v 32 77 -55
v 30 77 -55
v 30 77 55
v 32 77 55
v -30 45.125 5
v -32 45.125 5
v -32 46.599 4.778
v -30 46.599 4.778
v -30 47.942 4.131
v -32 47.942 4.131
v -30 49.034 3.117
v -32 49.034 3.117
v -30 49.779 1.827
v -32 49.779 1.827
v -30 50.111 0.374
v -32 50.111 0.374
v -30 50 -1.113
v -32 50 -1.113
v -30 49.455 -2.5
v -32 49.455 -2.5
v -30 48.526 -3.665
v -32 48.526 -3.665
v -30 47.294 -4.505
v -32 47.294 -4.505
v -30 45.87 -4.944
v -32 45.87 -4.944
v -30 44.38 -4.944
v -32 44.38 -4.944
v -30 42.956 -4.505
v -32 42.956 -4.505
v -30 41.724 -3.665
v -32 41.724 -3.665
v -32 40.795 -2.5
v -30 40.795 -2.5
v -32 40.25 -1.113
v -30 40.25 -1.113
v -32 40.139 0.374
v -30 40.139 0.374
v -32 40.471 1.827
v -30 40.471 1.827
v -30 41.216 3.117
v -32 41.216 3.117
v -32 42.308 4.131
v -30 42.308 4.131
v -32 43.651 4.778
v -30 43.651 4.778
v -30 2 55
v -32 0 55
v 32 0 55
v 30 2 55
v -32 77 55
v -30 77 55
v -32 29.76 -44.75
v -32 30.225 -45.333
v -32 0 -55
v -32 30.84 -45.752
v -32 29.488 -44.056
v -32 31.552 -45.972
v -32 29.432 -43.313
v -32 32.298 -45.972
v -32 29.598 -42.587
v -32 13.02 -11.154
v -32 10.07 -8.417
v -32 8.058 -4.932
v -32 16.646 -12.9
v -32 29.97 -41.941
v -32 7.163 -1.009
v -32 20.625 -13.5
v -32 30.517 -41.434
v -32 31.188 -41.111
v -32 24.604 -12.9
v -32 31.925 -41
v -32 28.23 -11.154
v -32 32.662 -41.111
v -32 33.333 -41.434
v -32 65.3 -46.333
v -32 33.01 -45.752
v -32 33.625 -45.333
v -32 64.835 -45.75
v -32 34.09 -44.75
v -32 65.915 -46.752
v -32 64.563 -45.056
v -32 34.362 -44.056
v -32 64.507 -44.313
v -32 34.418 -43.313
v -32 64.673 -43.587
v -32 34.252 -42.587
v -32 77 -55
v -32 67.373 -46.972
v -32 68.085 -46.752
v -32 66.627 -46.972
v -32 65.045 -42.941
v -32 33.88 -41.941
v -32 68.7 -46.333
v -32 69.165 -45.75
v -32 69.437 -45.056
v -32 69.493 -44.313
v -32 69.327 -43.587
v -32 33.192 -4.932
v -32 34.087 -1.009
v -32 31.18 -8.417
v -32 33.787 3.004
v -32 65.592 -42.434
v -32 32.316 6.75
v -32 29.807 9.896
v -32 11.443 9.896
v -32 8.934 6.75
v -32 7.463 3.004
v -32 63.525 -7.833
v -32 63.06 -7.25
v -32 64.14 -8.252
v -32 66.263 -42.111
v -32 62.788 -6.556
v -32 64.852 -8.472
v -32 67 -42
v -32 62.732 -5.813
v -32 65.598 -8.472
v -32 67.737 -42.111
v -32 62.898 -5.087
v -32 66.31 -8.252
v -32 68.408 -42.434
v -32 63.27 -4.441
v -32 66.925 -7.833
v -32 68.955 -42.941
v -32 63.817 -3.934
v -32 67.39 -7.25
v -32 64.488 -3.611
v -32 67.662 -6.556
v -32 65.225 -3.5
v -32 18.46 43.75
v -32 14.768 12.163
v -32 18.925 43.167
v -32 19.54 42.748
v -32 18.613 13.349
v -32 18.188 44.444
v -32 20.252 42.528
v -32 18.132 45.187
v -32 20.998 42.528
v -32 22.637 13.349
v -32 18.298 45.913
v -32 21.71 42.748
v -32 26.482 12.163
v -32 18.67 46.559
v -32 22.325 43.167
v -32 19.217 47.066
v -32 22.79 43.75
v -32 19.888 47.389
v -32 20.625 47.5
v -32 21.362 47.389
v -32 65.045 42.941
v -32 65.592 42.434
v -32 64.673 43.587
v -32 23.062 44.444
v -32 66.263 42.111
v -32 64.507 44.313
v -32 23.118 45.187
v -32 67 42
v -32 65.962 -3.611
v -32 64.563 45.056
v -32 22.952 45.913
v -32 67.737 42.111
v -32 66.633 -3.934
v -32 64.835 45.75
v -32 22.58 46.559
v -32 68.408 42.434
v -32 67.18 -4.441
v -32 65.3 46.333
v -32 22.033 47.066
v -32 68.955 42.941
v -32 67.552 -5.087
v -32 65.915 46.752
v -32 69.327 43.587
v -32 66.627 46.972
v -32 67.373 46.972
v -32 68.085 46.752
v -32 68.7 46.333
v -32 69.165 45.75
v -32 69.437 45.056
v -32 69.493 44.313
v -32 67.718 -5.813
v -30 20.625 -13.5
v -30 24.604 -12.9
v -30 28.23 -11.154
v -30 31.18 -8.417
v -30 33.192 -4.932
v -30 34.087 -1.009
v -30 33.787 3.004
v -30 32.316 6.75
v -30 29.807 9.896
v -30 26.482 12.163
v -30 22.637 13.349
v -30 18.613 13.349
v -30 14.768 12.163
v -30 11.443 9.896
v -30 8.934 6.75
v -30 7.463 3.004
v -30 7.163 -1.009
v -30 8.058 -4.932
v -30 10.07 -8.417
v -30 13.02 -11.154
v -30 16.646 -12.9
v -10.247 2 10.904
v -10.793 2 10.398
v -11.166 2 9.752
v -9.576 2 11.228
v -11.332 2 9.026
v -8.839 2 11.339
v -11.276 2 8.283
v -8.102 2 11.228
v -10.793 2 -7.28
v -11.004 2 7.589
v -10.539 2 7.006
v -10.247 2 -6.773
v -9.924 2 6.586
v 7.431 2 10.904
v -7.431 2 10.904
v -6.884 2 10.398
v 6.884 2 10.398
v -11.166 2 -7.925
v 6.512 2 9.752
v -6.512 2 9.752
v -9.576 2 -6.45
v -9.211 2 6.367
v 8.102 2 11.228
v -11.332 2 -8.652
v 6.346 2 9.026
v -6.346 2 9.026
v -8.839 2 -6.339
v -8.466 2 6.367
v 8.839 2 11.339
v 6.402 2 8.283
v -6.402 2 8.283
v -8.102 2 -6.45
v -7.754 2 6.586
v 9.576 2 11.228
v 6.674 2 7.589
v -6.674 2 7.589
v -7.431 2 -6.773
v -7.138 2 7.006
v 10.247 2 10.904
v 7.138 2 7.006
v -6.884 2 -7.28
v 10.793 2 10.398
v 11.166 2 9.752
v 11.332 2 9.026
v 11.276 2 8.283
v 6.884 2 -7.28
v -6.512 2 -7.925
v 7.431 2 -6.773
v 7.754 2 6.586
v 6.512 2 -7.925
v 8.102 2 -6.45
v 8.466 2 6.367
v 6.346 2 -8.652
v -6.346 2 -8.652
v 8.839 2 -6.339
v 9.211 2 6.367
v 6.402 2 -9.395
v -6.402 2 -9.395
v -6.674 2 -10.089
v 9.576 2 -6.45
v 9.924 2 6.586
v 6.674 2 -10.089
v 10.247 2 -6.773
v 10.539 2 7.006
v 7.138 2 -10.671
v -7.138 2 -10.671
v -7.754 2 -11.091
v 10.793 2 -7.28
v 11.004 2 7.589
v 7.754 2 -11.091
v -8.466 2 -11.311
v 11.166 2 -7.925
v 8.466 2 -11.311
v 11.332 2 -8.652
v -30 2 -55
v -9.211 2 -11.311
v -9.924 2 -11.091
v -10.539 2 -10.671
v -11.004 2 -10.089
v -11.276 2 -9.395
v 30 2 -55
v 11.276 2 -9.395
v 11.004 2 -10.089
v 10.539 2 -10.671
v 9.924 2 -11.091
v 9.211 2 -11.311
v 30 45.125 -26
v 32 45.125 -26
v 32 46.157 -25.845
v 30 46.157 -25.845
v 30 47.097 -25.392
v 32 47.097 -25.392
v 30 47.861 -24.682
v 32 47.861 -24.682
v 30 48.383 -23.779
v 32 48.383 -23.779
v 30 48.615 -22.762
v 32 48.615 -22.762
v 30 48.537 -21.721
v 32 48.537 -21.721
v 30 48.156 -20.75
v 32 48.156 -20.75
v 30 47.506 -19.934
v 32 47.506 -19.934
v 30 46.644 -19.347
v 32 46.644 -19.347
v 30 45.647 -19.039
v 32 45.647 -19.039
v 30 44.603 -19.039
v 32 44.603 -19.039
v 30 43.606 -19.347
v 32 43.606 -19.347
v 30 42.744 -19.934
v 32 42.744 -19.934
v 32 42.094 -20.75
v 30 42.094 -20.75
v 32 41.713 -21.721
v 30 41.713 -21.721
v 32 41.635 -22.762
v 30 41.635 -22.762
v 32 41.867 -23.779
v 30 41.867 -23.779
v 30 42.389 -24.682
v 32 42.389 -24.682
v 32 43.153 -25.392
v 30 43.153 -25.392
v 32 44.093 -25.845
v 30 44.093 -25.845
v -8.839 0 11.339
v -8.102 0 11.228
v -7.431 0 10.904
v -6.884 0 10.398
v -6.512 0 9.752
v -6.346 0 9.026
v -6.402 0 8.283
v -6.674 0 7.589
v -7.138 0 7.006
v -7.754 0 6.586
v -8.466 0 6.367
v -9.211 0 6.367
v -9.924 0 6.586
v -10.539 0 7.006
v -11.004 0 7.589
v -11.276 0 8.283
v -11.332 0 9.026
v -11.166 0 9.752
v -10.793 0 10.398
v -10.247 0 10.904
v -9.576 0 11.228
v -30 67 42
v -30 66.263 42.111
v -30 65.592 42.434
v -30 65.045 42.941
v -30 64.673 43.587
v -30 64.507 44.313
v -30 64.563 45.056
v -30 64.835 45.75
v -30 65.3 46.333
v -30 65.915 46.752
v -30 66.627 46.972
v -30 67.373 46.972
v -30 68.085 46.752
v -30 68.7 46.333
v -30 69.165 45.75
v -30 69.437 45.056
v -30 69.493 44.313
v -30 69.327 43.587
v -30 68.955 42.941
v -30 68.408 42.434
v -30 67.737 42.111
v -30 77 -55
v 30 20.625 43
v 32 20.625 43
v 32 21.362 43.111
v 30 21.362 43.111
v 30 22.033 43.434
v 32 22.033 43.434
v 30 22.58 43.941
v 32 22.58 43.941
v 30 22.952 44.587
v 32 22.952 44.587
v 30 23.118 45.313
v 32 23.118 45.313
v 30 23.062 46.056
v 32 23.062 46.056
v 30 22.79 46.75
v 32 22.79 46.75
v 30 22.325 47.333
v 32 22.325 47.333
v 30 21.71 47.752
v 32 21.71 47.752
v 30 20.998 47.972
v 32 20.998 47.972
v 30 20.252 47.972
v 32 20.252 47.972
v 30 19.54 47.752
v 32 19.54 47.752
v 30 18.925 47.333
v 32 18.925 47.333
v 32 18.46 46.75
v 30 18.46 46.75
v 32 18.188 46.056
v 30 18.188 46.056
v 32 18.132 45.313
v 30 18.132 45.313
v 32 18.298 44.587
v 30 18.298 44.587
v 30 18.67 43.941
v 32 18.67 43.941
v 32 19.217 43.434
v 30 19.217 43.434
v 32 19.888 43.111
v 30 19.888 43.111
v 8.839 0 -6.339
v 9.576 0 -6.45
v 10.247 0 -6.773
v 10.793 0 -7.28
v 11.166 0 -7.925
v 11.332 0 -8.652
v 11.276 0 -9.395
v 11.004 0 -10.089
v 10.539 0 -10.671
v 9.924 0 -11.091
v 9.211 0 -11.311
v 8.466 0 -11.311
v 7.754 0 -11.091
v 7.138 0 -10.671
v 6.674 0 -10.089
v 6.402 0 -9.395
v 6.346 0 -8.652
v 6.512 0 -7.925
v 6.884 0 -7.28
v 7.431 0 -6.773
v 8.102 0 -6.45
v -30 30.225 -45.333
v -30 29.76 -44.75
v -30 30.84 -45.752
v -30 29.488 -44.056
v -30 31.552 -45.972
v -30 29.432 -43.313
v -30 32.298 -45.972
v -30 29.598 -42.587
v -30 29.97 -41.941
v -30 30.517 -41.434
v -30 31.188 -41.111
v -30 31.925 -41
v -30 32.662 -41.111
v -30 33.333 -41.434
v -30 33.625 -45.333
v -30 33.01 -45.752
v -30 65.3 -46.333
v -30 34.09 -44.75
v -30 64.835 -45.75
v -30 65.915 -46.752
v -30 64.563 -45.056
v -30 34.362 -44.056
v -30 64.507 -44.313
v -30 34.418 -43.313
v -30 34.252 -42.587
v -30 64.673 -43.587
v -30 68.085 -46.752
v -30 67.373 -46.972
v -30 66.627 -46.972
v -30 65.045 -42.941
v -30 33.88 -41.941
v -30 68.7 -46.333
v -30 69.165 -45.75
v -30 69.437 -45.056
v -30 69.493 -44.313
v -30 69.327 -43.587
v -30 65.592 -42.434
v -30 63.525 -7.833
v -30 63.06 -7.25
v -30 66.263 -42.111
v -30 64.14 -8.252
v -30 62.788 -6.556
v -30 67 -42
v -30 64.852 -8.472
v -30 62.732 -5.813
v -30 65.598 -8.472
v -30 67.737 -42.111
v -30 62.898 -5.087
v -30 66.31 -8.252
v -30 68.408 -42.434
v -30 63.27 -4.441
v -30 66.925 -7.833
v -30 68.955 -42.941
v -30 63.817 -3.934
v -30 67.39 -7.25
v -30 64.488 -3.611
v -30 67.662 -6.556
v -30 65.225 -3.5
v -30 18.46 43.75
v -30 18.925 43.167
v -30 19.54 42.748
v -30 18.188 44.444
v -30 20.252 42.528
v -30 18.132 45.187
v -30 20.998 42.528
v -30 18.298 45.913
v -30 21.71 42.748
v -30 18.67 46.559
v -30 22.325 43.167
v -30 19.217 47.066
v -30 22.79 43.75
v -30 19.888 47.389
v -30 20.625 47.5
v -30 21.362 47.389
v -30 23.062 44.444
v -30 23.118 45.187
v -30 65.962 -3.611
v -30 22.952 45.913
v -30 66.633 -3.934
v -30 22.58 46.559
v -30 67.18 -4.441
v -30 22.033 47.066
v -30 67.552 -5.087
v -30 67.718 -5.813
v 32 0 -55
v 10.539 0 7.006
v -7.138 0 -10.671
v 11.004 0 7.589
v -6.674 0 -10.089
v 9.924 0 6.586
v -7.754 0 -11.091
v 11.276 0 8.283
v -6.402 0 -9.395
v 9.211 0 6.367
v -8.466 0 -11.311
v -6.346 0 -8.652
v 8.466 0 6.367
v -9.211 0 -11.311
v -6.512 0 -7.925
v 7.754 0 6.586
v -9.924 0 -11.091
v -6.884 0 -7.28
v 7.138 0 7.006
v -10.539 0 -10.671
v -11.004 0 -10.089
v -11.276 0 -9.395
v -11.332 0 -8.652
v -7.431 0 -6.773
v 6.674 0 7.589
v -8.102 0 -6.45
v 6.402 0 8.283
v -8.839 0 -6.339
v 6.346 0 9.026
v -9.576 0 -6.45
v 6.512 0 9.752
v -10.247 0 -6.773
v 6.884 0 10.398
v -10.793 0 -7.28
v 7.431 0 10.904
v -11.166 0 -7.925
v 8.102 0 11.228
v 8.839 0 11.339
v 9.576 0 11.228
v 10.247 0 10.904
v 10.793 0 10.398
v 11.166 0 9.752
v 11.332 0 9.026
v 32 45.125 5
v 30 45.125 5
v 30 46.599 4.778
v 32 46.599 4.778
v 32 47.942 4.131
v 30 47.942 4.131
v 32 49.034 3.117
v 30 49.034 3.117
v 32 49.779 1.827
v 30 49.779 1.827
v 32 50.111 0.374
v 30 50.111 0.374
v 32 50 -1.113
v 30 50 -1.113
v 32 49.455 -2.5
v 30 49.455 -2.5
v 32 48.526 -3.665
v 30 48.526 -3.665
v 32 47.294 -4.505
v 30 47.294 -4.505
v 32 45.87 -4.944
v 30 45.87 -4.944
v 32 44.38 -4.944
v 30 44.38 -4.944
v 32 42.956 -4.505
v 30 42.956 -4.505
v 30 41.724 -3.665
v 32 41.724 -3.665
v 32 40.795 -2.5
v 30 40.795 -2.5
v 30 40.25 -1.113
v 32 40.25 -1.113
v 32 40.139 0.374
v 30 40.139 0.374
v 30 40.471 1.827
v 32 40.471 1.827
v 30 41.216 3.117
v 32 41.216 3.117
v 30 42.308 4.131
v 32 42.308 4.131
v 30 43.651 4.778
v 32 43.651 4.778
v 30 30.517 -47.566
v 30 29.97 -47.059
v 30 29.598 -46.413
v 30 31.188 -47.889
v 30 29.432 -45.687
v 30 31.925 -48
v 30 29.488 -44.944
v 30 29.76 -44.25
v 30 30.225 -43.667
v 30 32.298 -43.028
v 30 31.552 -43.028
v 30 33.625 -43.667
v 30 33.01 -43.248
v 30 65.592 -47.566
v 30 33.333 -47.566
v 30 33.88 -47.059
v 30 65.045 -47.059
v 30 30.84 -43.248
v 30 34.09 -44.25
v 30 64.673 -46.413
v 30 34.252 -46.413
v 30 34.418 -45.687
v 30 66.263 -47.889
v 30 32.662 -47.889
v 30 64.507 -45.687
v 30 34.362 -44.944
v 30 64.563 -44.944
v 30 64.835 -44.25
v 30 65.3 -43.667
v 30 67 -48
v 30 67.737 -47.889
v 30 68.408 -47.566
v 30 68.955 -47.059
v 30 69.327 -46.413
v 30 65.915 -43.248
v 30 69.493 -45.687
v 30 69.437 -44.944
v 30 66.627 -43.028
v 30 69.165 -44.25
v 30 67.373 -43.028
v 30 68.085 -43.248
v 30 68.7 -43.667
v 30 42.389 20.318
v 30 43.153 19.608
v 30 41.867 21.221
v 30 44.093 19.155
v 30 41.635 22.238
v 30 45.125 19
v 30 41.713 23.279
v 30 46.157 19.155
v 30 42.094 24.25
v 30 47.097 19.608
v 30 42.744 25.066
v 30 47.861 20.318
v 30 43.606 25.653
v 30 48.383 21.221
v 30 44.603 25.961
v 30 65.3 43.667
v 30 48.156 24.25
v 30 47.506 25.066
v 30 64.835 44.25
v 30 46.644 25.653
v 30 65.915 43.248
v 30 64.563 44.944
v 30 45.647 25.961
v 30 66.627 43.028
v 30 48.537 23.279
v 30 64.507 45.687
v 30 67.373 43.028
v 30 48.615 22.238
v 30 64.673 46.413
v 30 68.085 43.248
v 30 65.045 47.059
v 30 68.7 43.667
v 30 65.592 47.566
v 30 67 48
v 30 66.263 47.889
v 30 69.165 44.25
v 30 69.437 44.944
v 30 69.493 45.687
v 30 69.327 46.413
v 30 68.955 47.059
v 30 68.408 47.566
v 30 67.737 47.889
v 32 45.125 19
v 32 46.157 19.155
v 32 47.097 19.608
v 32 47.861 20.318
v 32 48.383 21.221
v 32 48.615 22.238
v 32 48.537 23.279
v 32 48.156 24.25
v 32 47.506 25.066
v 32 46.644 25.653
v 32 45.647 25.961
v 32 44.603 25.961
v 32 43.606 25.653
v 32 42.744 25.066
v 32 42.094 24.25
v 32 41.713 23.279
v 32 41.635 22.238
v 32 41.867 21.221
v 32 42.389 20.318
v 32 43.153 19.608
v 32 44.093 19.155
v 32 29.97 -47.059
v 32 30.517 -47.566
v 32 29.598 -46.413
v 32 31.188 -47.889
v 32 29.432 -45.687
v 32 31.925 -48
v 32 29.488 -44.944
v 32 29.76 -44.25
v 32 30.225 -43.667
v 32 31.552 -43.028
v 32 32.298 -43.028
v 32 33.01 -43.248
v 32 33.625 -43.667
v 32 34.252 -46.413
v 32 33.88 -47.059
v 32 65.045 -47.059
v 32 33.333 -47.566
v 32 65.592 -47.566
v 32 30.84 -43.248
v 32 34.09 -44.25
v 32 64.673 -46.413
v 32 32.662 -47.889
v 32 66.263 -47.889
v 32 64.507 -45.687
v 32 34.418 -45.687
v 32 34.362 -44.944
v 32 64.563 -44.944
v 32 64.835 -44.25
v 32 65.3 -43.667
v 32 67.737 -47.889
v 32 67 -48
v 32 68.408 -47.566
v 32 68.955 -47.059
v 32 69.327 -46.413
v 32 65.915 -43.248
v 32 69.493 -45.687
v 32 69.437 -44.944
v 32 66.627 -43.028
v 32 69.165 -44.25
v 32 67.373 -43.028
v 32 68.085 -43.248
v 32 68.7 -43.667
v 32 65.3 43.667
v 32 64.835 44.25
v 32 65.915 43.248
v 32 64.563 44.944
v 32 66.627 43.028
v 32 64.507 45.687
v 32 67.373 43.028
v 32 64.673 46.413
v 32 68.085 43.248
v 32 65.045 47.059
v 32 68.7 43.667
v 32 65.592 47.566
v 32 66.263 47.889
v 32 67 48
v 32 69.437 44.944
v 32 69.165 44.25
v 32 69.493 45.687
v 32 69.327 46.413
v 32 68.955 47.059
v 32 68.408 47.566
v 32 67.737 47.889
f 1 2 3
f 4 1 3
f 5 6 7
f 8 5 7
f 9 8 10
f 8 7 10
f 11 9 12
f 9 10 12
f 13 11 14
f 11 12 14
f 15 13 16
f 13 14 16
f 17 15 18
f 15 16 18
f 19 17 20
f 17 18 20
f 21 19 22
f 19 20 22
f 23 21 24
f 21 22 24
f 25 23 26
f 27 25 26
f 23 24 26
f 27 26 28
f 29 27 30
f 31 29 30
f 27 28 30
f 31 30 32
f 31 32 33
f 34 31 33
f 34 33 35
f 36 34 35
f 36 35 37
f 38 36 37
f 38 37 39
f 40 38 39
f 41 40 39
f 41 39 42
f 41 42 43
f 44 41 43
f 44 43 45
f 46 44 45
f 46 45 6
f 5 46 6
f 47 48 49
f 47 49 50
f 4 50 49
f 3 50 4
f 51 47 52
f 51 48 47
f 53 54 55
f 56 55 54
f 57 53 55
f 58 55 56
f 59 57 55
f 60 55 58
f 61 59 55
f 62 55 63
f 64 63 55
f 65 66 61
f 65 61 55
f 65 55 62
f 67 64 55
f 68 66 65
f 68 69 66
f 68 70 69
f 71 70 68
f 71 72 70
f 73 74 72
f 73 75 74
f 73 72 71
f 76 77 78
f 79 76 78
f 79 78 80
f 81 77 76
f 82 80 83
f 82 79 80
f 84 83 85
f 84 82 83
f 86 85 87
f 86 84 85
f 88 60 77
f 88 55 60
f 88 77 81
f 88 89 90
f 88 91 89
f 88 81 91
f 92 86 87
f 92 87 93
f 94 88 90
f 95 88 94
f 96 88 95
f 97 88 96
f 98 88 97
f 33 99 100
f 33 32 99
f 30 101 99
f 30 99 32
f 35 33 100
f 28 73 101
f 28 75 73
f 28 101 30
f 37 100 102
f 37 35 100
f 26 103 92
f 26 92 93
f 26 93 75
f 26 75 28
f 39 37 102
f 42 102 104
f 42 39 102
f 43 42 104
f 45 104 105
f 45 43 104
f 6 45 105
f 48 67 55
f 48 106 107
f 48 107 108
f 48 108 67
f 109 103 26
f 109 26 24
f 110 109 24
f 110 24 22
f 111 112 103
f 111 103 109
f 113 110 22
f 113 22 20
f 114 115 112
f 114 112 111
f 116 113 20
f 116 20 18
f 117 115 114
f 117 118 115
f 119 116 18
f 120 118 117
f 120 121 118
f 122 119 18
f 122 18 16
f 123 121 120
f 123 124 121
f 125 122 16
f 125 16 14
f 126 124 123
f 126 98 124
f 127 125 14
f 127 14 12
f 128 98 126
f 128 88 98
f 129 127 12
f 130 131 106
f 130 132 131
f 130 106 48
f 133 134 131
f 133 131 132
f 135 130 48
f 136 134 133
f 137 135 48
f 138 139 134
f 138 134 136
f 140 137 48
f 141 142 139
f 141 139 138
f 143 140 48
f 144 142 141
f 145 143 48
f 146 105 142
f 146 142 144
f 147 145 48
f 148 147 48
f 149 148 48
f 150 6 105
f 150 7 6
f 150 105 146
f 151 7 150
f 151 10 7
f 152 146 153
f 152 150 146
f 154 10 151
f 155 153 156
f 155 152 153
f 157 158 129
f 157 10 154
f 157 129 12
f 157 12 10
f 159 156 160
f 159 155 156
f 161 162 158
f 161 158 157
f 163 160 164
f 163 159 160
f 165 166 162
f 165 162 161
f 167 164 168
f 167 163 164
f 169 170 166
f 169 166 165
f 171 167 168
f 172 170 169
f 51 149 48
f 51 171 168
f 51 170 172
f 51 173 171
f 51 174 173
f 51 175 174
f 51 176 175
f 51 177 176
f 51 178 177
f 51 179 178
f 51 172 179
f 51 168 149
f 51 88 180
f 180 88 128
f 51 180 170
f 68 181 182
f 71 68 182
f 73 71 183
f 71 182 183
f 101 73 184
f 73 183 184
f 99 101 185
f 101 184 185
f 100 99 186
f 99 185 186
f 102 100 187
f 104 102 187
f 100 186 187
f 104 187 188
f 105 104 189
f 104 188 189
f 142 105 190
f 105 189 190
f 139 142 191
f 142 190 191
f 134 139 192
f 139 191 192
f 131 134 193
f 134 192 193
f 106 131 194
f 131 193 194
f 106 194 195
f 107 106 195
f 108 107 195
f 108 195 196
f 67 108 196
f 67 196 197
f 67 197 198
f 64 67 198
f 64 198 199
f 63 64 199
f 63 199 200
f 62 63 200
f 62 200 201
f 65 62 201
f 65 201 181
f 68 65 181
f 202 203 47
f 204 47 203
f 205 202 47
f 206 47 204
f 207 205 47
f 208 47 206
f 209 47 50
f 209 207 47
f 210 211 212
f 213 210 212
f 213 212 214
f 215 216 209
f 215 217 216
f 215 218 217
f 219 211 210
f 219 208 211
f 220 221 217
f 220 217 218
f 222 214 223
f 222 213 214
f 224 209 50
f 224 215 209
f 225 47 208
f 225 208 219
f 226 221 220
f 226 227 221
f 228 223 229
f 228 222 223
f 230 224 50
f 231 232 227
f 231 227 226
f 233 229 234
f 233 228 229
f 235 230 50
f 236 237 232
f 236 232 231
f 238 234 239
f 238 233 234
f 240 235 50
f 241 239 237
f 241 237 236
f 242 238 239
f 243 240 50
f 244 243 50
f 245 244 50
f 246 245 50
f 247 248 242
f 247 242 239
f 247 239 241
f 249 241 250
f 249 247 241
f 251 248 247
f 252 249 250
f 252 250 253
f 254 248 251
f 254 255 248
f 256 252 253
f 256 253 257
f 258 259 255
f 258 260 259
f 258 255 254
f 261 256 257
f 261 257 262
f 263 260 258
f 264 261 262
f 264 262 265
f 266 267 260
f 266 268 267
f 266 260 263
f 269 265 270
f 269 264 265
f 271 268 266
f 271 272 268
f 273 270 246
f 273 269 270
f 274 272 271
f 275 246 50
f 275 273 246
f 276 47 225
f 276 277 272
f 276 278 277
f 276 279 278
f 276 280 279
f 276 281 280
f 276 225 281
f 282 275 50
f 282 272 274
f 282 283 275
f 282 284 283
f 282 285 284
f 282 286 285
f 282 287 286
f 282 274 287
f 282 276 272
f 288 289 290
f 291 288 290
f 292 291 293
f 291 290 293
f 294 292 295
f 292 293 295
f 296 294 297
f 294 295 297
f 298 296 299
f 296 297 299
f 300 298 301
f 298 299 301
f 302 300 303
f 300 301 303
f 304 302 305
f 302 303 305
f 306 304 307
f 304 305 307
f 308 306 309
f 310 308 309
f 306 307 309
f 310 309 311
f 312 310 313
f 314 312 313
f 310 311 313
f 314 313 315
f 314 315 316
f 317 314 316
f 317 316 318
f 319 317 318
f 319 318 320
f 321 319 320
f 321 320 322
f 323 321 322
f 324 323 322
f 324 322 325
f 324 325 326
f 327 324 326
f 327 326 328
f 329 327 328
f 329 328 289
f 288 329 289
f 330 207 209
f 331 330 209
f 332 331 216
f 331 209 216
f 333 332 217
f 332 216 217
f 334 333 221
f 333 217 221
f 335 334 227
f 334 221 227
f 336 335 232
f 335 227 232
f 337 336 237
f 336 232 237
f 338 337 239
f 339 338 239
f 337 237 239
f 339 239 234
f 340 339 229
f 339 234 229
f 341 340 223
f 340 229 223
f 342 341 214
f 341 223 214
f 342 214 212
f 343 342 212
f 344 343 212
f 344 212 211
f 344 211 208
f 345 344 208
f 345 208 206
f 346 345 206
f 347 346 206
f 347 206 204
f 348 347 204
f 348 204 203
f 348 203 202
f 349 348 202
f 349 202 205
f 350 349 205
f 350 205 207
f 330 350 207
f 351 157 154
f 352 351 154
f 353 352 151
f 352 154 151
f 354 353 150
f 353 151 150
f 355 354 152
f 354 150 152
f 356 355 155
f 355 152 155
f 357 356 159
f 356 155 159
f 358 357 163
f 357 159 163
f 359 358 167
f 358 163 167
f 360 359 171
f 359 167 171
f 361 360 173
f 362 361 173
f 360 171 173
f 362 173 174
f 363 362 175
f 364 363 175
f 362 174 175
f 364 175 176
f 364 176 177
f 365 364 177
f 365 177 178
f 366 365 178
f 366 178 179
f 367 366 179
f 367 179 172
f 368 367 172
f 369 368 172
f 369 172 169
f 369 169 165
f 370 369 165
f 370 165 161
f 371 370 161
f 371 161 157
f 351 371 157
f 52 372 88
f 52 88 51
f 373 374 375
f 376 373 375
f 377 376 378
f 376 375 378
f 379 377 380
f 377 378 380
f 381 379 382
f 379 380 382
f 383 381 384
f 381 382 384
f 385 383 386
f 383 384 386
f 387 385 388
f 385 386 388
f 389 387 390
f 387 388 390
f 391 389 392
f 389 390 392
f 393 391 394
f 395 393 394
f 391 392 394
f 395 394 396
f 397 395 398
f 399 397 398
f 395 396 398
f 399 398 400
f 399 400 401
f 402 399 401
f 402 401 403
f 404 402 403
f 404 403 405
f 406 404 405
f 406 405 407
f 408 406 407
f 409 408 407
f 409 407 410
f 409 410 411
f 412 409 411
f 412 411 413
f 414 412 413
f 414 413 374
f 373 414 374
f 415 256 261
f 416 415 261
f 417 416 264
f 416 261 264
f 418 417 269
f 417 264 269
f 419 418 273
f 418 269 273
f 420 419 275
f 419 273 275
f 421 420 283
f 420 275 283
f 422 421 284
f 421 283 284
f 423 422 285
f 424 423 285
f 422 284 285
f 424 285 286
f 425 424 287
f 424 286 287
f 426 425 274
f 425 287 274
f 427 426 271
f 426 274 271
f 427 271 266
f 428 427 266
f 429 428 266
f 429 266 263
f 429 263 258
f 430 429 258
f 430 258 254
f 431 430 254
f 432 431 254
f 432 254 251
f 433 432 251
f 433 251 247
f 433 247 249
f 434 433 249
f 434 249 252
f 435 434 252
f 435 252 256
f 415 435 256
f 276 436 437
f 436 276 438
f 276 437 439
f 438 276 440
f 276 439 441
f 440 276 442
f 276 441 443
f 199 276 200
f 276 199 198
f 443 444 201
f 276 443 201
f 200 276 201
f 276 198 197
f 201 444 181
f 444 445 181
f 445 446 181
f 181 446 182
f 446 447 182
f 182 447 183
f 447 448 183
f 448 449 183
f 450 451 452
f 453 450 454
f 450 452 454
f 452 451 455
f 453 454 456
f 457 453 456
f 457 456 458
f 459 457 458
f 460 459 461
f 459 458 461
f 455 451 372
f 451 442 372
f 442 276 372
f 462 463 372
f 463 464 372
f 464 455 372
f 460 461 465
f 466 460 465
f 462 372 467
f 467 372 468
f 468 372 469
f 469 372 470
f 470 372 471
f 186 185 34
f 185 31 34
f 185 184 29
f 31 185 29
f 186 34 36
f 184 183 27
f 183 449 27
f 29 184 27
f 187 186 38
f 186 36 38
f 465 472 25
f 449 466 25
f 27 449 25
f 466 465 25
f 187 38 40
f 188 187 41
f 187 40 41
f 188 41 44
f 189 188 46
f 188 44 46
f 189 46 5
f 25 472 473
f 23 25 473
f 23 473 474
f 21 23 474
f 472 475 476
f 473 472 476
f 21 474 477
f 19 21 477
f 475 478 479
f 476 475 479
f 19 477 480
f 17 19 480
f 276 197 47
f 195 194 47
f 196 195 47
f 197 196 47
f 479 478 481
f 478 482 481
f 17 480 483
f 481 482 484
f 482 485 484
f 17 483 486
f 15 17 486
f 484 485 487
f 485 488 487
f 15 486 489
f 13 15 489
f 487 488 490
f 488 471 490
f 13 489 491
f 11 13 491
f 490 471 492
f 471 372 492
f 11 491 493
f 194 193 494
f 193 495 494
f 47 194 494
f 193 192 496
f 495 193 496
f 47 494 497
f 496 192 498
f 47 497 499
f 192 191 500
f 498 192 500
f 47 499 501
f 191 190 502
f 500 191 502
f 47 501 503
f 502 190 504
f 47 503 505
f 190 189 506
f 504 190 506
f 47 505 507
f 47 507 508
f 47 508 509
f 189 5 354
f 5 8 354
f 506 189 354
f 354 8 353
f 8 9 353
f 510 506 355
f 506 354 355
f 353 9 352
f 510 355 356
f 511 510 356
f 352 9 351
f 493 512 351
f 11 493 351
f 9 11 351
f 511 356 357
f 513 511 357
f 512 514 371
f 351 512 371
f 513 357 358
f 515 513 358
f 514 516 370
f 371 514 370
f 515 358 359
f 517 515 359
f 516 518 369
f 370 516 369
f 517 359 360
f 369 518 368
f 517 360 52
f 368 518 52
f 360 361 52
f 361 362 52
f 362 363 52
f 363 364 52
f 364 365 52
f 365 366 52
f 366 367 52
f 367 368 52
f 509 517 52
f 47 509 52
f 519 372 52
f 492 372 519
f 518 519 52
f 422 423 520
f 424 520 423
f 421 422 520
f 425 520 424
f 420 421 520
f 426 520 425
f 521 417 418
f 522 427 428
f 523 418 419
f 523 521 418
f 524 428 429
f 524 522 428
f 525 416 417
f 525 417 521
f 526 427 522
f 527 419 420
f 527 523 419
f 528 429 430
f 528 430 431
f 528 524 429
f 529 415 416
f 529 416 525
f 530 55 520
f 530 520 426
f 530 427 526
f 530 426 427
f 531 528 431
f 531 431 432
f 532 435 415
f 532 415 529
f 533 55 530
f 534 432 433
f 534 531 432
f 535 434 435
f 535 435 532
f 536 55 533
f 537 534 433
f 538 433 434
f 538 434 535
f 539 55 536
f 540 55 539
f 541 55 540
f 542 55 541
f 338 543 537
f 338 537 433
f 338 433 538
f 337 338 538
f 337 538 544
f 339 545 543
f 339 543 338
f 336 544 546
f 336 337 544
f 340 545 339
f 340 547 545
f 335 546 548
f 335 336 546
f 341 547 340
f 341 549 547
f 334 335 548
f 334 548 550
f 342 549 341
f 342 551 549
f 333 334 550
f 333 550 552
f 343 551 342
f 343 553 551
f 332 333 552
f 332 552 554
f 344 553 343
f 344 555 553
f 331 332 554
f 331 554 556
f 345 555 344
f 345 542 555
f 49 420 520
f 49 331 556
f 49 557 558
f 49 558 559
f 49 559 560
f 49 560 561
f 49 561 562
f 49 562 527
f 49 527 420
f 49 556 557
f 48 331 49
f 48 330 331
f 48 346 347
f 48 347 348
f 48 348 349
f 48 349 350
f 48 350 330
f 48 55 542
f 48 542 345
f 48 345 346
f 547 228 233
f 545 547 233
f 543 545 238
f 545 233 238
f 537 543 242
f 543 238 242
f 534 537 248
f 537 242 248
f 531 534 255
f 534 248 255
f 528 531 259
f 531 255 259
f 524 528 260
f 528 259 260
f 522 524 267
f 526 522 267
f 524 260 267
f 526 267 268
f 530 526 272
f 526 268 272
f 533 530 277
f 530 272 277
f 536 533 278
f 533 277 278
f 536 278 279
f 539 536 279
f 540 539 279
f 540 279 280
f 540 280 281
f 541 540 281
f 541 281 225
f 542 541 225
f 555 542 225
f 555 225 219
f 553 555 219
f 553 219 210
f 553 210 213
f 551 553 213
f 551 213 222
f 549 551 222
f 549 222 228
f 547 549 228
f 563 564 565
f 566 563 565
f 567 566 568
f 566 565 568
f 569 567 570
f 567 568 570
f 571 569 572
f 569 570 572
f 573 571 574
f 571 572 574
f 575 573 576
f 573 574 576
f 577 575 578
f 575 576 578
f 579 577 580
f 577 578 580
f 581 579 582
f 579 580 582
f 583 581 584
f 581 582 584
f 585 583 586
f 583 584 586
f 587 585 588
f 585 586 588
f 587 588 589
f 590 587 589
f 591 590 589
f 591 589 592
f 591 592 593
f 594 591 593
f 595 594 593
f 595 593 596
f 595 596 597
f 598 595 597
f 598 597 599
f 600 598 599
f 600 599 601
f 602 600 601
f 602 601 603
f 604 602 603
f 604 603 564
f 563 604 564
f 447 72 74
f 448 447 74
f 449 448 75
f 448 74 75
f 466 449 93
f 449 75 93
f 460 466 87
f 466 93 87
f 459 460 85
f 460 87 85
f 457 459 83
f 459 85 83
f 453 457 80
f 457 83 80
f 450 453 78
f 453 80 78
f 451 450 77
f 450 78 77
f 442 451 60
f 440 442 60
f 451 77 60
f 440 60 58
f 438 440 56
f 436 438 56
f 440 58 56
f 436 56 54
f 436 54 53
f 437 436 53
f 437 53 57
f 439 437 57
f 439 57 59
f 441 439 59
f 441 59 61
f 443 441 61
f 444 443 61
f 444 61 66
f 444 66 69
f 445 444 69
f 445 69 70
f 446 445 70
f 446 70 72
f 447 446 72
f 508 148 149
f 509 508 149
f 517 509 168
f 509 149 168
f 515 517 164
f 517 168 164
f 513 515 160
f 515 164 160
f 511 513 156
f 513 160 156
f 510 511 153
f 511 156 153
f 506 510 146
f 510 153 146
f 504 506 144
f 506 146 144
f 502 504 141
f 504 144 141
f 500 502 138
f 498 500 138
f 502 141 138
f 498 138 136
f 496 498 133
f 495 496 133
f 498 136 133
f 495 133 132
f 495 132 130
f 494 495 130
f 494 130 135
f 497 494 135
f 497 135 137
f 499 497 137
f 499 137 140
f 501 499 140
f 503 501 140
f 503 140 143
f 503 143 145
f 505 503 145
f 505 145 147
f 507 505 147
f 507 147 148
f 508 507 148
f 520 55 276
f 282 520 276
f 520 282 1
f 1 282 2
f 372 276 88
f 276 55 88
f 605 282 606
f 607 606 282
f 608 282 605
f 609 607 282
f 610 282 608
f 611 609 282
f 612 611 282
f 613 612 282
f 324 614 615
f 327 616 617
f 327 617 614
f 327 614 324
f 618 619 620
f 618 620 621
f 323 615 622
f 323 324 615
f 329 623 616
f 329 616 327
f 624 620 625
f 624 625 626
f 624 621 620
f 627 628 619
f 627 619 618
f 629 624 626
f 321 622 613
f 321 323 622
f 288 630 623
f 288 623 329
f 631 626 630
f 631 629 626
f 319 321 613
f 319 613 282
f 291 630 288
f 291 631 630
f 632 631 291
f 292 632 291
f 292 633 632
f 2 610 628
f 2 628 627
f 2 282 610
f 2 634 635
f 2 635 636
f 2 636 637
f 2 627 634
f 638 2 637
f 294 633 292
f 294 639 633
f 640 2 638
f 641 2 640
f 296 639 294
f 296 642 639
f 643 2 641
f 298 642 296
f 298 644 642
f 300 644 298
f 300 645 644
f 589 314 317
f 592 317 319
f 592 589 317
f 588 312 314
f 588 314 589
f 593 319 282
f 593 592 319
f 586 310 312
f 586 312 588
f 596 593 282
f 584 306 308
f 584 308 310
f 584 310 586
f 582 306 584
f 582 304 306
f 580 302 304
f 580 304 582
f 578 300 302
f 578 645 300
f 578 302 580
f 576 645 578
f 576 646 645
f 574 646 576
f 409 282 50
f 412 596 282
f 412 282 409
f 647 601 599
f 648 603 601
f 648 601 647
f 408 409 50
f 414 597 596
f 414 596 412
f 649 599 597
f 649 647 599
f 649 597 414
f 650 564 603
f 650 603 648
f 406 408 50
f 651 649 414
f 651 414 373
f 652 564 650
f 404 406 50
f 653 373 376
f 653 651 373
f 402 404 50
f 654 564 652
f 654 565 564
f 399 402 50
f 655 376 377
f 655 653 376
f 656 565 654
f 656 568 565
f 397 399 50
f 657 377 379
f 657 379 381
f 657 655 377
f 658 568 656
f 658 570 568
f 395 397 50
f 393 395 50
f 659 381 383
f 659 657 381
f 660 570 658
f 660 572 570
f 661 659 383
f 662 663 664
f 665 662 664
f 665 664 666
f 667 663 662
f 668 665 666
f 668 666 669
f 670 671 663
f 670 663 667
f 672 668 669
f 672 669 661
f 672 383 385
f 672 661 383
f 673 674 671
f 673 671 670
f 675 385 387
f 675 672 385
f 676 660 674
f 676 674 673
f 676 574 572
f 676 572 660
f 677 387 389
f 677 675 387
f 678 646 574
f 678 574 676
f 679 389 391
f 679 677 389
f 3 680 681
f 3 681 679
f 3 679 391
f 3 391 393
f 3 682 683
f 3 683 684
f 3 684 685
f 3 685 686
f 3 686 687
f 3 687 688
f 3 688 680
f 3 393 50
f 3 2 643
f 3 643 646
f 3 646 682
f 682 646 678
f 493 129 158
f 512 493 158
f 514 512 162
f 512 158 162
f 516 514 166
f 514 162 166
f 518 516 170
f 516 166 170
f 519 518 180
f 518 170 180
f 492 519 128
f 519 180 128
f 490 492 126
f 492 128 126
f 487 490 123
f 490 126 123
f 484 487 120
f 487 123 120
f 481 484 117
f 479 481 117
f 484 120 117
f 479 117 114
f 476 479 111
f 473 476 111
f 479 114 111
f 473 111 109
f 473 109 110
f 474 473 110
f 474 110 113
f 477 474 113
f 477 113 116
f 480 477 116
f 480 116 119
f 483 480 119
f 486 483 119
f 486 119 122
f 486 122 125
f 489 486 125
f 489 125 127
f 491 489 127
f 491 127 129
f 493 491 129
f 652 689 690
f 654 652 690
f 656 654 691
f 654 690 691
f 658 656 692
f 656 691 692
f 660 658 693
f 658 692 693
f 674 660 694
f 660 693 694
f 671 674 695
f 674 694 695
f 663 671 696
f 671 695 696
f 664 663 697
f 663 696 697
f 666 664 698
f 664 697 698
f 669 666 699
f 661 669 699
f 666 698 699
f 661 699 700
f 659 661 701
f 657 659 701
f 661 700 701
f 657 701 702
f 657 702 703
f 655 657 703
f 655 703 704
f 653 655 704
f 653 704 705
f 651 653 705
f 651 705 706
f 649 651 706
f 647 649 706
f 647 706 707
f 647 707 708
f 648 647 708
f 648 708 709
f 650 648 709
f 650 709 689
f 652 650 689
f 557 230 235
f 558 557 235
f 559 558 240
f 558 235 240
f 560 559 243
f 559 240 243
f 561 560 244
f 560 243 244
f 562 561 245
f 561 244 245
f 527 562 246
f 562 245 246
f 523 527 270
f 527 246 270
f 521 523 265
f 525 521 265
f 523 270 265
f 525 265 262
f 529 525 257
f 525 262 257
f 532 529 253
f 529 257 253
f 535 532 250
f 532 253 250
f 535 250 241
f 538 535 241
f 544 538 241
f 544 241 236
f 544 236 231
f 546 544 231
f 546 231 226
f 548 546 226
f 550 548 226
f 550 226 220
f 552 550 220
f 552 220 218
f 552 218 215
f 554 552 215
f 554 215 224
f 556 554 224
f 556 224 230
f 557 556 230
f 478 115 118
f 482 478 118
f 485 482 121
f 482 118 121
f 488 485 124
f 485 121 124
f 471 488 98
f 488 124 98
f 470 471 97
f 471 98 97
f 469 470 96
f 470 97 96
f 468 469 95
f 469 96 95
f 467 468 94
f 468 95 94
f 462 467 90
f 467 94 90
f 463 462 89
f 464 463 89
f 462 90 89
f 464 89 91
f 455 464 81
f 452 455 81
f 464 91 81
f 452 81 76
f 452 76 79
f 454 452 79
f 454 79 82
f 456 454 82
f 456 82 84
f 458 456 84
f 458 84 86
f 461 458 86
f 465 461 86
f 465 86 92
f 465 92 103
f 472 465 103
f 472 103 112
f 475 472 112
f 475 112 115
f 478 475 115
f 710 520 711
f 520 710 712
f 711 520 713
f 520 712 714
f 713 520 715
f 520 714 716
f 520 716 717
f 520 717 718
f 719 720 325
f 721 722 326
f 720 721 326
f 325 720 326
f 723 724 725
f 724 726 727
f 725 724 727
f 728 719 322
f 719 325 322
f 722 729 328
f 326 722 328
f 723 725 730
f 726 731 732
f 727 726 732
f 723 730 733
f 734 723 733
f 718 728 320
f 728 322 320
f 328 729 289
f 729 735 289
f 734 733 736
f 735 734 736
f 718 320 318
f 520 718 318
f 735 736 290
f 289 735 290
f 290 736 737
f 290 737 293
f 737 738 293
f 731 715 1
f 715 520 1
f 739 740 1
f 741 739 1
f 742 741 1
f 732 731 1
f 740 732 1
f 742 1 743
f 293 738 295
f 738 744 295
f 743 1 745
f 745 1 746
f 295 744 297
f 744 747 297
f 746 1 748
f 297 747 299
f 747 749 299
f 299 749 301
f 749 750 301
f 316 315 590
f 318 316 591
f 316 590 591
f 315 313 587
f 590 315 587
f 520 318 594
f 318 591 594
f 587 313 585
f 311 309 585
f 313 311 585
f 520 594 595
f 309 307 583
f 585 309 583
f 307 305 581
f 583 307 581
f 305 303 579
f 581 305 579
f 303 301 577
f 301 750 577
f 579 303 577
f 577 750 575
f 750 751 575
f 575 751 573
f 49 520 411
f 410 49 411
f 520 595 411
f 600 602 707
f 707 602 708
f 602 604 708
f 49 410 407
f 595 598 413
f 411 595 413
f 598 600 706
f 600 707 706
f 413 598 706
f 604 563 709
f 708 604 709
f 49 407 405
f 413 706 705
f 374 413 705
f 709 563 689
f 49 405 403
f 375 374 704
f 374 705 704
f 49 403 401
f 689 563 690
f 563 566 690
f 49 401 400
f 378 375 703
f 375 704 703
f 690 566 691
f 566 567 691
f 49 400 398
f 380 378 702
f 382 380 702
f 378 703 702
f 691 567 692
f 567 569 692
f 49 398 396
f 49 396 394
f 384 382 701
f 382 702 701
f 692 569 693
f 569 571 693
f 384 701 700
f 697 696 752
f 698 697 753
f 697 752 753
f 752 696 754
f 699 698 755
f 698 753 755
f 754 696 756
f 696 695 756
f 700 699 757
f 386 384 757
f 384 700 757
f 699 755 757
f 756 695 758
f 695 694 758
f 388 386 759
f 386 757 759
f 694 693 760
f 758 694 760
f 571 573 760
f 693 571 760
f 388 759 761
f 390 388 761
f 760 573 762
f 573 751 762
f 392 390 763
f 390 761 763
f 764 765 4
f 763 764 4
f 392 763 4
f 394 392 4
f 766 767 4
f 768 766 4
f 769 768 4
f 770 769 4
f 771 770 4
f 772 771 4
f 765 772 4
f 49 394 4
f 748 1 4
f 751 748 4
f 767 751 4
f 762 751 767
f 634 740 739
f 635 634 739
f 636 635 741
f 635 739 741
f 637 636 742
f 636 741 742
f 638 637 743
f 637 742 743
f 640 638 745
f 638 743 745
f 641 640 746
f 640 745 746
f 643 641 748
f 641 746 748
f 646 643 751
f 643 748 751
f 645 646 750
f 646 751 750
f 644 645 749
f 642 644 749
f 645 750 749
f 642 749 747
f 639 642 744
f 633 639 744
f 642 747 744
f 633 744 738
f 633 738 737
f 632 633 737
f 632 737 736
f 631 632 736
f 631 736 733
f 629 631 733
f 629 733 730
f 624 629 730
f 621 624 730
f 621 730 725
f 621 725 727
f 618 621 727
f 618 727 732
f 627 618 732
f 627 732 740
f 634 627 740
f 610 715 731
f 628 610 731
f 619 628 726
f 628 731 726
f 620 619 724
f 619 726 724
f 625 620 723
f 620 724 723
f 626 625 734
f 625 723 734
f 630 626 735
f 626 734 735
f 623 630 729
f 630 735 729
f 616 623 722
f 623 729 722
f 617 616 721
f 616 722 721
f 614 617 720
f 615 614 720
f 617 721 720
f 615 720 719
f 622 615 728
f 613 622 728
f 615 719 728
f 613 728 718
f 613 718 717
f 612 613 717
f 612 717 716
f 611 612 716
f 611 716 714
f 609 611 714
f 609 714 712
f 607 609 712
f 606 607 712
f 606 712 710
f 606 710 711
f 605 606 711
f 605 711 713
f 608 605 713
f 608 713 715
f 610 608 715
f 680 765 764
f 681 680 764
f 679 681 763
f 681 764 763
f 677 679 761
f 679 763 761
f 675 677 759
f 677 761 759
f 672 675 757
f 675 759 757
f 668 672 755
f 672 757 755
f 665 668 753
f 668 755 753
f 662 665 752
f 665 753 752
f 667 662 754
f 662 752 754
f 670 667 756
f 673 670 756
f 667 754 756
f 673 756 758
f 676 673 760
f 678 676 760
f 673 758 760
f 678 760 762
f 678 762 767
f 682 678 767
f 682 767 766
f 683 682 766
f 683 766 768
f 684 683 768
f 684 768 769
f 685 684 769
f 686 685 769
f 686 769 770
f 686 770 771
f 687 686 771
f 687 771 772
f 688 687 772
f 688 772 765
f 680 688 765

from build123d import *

# Parameters (mm, degrees)
ESBO_O1_W                  = 60
ESBO_O1_H                  = 110
ESBO_O1_R                  = 25
RESSALTO_EXTRUS_O1_DEPTH   = 2
ESBO_O2_W                  = 110
ESBO_O2_H                  = 77
RESSALTO_EXTRUS_O2_DEPTH   = 2
ESBO_O5_R                  = 13.5
ESBO_O5_R_2                = 1
CORTE_EXTRUS_O3_DEPTH      = 10
ESBO_O6_R                  = 2.5
CORTE_EXTRUS_O4_DEPTH      = 10
ESBO_O8_R                  = 5
CORTE_EXTRUS_O7_DEPTH      = 115.236596588
CORTE_EXTRUS_O7_DEPTH_BACK = 115.236596588
ESBO_O9_R                  = 2.5
CORTE_EXTRUS_O8_DEPTH      = 10
ESBO_O12_R                 = 2.5
CORTE_EXTRUS_O9_DEPTH      = 10
CORTE_EXTRUS_O10_REACH     = 116.237
ESBO_O13_R                 = 2.5
ESBO_O15_R                 = 3.5
CORTE_EXTRUS_O11_DEPTH     = 10
CUT_EXTRUDE1_REACH         = 116.237
SKETCH1_R                  = 2.5


with BuildPart() as part:
    # Esboço1 → Ressalto-extrusão1 (new body)
    with BuildSketch(Plane(origin=(0, 0, 0), x_dir=(1, 0, 0), z_dir=(0, 1, 0))):
        Rectangle(ESBO_O1_W, ESBO_O1_H)
        Circle(ESBO_O1_R, mode=Mode.SUBTRACT)
        Circle(ESBO_O1_R)
    extrude(amount=RESSALTO_EXTRUS_O1_DEPTH)

    # Esboço2 → Ressalto-extrusão2 (add)
    with BuildSketch(Plane.ZY.offset(30)):
        with Locations((0, 38.5)):
            Rectangle(ESBO_O2_W, ESBO_O2_H)
    ressalto_extrus_o2 = extrude(amount=RESSALTO_EXTRUS_O2_DEPTH)

    # Espelhar1: Ressalto-extrusão2 across plane
    add(ressalto_extrus_o2.mirror(Plane(origin=(0, 0, 0), x_dir=(0, 0, 1), z_dir=(1, 0, 0))))

    # Esboço5 → Corte-extrusão3 (cut)
    with BuildSketch(Plane(origin=(-30, 0, 0), x_dir=(0, 0, -1), z_dir=(1, 0, 0))):
        with Locations((0, 20.625)):
            Circle(ESBO_O5_R)
        with Locations((0, 20.625)):
            Circle(ESBO_O5_R_2, mode=Mode.SUBTRACT)
        with Locations((0, 20.625)):
            Circle(ESBO_O5_R_2)
    extrude(amount=-CORTE_EXTRUS_O3_DEPTH, mode=Mode.SUBTRACT)

    # Esboço6 → Corte-extrusão4 (cut)
    with BuildSketch(Plane.ZY.offset(32)):
        with Locations((45, 20.625)):
            Circle(ESBO_O6_R)
        with Locations((-6, 65.225)):
            Circle(ESBO_O6_R)
        with Locations((-43.5, 31.925)):
            Circle(ESBO_O6_R)
    extrude(amount=-CORTE_EXTRUS_O4_DEPTH, mode=Mode.SUBTRACT)

    # Esboço8 → Corte-extrusão7 (cut, two sides)
    with BuildSketch(Plane.ZY.offset(32)) as corte_extrus_o7_sk:
        with Locations((0, 45.125)):
            Circle(ESBO_O8_R)
    extrude(amount=CORTE_EXTRUS_O7_DEPTH, mode=Mode.SUBTRACT)
    extrude(corte_extrus_o7_sk.sketch, amount=-CORTE_EXTRUS_O7_DEPTH_BACK, mode=Mode.SUBTRACT)

    # Esboço9 → Corte-extrusão8 (cut)
    with BuildSketch(Plane(origin=(0, 2, 0), x_dir=(1, 0, 0), z_dir=(0, 1, 0))):
        with Locations(Location((-8.838834765, 8.838834765, 0), (0, 0, 270))):
            Circle(ESBO_O9_R)
        with Locations(Location((-8.838834765, -8.838834765, 0), (0, 0, 270))):
            Circle(ESBO_O9_R)
        with Locations(Location((8.838834765, 8.838834765, 0), (0, 0, 270))):
            Circle(ESBO_O9_R)
        with Locations(Location((8.838834765, -8.838834765, 0), (0, 0, 270))):
            Circle(ESBO_O9_R)
    extrude(amount=-CORTE_EXTRUS_O8_DEPTH, mode=Mode.SUBTRACT)

    # Esboço12 → Corte-extrusão9 (cut)
    with BuildSketch(Plane(origin=(32, 0, 0), x_dir=(0, 0, -1), z_dir=(1, 0, 0))):
        with Locations((45.5, 31.925)):
            Circle(ESBO_O12_R)
        with Locations((-45.5, 20.625)):
            Circle(ESBO_O12_R)
    extrude(amount=-CORTE_EXTRUS_O9_DEPTH, mode=Mode.SUBTRACT)

    # Esboço13 → Corte-extrusão10 (cut, up to next)
    with BuildSketch(Plane.ZY.offset(32), mode=Mode.PRIVATE) as corte_extrus_o10_sk1:
        with Locations((-44.5, 67)):
            Circle(ESBO_O13_R)
    corte_extrus_o10_tool1 = extrude(corte_extrus_o10_sk1.sketch, amount=-CORTE_EXTRUS_O10_REACH, mode=Mode.PRIVATE) & part.part
    # Esboço13 → Corte-extrusão10 (cut, up to next)
    with BuildSketch(Plane.ZY.offset(32), mode=Mode.PRIVATE) as corte_extrus_o10_sk2:
        with Locations(Location((44.5, 67, 0), (0, 0, 180))):
            Circle(ESBO_O13_R)
    corte_extrus_o10_tool2 = extrude(corte_extrus_o10_sk2.sketch, amount=-CORTE_EXTRUS_O10_REACH, mode=Mode.PRIVATE) & part.part
    add(corte_extrus_o10_tool1.solids().sort_by_distance((-32, 67, -44.5))[0], mode=Mode.SUBTRACT)
    add(corte_extrus_o10_tool2.solids().sort_by_distance((-32, 67, 44.5))[0], mode=Mode.SUBTRACT)

    # Esboço15 → Corte-extrusão11 (cut)
    with BuildSketch(Plane(origin=(32, 0, 0), x_dir=(0, 0, -1), z_dir=(1, 0, 0))):
        with Locations((-22.5, 45.125)):
            Circle(ESBO_O15_R)
        with Locations((22.5, 45.125)):
            Circle(ESBO_O15_R)
    extrude(amount=-CORTE_EXTRUS_O11_DEPTH, mode=Mode.SUBTRACT)

    # Sketch1 → Cut-Extrude1 (cut, up to next)
    with BuildSketch(Plane(origin=(32, 0, 0), x_dir=(0, 0, -1), z_dir=(1, 0, 0)), mode=Mode.PRIVATE) as cut_extrude1_sk1:
        with Locations((45.5, 67)):
            Circle(SKETCH1_R)
    cut_extrude1_tool1 = extrude(cut_extrude1_sk1.sketch, amount=-CUT_EXTRUDE1_REACH, mode=Mode.PRIVATE) & part.part
    # Sketch1 → Cut-Extrude1 (cut, up to next)
    with BuildSketch(Plane(origin=(32, 0, 0), x_dir=(0, 0, -1), z_dir=(1, 0, 0)), mode=Mode.PRIVATE) as cut_extrude1_sk2:
        with Locations(Location((-45.5, 67, 0), (0, 0, 180))):
            Circle(SKETCH1_R)
    cut_extrude1_tool2 = extrude(cut_extrude1_sk2.sketch, amount=-CUT_EXTRUDE1_REACH, mode=Mode.PRIVATE) & part.part
    add(cut_extrude1_tool1.solids().sort_by_distance((32, 67, -45.5))[0], mode=Mode.SUBTRACT)
    add(cut_extrude1_tool2.solids().sort_by_distance((32, 67, 45.5))[0], mode=Mode.SUBTRACT)


solid = part.part
